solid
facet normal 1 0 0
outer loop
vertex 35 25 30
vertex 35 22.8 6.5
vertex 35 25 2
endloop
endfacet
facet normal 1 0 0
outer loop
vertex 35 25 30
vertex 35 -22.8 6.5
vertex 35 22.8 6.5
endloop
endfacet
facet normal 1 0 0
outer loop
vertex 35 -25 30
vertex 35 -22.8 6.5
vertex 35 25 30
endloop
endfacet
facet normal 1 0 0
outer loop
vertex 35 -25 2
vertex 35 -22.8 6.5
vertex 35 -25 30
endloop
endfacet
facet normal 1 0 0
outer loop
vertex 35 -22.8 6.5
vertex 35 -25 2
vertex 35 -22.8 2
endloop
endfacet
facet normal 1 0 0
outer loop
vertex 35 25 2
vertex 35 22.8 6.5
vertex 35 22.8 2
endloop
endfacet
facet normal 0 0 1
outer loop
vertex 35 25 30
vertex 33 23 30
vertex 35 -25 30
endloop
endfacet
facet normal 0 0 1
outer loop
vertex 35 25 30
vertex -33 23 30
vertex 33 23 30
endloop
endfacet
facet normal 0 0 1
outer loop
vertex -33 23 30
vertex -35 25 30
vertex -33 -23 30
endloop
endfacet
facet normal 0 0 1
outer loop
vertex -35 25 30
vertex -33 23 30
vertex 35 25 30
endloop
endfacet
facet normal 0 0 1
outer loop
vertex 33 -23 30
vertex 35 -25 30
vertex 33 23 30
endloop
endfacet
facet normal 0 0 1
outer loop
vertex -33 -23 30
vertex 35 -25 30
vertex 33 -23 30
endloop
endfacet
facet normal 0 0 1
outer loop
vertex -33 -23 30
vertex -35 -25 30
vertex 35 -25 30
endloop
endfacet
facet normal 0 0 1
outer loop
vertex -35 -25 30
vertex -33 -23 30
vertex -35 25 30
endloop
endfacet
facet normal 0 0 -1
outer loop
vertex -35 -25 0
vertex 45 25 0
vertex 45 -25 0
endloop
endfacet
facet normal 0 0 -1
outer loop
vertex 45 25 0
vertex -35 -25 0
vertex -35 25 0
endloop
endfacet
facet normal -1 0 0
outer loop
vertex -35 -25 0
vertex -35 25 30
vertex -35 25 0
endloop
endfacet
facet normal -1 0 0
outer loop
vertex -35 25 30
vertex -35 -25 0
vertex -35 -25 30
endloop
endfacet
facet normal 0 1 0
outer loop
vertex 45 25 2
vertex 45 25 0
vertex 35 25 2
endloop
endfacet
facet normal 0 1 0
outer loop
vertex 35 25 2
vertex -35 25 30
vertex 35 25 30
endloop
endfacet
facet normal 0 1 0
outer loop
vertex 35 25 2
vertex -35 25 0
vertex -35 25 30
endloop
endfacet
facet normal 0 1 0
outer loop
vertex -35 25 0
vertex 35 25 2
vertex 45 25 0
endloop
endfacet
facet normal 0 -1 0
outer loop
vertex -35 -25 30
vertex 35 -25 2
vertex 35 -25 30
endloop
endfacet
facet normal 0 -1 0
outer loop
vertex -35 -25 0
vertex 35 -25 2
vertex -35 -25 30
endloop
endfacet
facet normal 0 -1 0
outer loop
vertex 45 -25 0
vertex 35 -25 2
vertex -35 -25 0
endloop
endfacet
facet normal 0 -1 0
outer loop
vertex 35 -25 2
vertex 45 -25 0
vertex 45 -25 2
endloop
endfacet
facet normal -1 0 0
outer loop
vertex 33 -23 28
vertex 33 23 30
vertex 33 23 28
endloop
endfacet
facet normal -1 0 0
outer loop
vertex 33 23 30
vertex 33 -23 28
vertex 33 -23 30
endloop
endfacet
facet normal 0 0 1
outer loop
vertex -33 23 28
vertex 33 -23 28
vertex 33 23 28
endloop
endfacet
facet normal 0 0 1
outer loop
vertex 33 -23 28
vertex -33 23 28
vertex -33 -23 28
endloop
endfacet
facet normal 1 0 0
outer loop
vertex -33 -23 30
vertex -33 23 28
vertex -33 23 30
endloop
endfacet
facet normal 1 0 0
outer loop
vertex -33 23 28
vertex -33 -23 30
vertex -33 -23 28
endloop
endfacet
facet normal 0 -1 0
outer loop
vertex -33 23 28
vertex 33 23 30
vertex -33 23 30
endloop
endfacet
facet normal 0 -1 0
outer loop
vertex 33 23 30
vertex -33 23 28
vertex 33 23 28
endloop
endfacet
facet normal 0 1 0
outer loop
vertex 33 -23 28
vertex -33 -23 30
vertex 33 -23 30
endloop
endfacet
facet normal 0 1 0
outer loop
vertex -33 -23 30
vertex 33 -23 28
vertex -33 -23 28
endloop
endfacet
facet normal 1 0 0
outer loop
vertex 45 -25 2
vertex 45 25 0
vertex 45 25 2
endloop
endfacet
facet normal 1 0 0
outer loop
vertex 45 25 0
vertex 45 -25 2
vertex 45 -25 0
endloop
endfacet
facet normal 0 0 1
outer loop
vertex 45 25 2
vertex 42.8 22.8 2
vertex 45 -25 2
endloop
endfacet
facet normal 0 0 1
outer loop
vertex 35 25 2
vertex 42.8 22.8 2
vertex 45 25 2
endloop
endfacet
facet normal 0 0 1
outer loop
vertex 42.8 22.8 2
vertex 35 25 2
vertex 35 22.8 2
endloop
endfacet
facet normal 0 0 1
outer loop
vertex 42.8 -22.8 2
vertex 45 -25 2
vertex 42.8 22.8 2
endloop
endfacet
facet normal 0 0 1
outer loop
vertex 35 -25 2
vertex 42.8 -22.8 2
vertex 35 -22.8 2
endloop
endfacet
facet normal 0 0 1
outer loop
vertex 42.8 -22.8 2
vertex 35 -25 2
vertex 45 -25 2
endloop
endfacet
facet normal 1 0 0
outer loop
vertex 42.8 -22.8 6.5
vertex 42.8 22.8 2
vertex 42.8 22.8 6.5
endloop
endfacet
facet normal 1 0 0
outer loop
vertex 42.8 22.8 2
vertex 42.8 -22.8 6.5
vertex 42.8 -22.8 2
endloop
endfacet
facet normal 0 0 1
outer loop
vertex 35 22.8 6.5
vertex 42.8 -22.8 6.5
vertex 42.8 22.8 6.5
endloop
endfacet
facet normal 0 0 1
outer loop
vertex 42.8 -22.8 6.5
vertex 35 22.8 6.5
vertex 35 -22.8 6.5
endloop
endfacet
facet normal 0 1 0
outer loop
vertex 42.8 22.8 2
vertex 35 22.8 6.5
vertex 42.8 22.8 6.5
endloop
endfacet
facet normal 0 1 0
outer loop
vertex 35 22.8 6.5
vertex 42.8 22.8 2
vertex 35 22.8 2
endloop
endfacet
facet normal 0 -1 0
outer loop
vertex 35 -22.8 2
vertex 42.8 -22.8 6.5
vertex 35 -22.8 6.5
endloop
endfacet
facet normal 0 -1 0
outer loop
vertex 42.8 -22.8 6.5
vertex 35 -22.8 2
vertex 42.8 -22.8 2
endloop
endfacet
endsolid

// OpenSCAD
// Two-part enclosure for a small electronics board (e.g. Arduino-based temperature logger)
// Print orientation: both parts lie on the bed (z = 0), side by side, with a 10 mm gap.
// Units: mm.

// ---------------- Parameters ----------------
box_x      = 70;    // box outer length (X)
box_y      = 50;    // box outer width (Y)
box_z      = 30;    // box outer height (Z)
wall       = 2;     // box wall thickness
floor      = 2;     // box floor thickness
lip_t      = 1.5;   // lid lip wall thickness
lip_h      = 4;     // lid lip height (from top of plate)
lip_outer_x = 65.6; // outer size of lip in X
lip_outer_y = 45.6; // outer size of lip in Y
clearance  = 0.2;   // clearance between lip outer size and box opening
gap        = 10;    // gap between box and lid
eps        = 0.5;   // cutter overshoot past faces

$fn = 64;

// Derived: box opening (inside dimensions)
opening_x = box_x - 2 * wall;   // 66
opening_y = box_y - 2 * wall;   // 46

// Derived: lip outer size with clearance (should match given values)
lip_outer_x_c = opening_x - clearance * 2; // 65.6
lip_outer_y_c = opening_y - clearance * 2; // 45.6

// ---------------- Modules ----------------
module box() {
    difference() {
        translate([-box_x / 2, -box_y / 2, 0])
            cube([box_x, box_y, box_z]);
        // open top: cut out the top floor (leaves floor = 2 mm)
        translate([-opening_x / 2, -opening_y / 2, box_z - floor])
            cube([opening_x, opening_y, floor + eps]);
    }
}

module lid() {
    // Plate lying on the bed
    plate_t = 2;
    union() {
        translate([-box_x / 2, -box_y / 2, 0])
            cube([box_x, box_y, plate_t]);
        // Lip: centred on plate, 1.5 mm thick wall, 4 mm tall
        translate([-lip_outer_x_c / 2, -lip_outer_y_c / 2, plate_t])
            cube([lip_outer_x_c, lip_outer_y_c, lip_h + eps]);
    }
}

// ---------------- Assembly ----------------
union() {
    box();
    translate([gap, 0, 0])
        lid();
}
